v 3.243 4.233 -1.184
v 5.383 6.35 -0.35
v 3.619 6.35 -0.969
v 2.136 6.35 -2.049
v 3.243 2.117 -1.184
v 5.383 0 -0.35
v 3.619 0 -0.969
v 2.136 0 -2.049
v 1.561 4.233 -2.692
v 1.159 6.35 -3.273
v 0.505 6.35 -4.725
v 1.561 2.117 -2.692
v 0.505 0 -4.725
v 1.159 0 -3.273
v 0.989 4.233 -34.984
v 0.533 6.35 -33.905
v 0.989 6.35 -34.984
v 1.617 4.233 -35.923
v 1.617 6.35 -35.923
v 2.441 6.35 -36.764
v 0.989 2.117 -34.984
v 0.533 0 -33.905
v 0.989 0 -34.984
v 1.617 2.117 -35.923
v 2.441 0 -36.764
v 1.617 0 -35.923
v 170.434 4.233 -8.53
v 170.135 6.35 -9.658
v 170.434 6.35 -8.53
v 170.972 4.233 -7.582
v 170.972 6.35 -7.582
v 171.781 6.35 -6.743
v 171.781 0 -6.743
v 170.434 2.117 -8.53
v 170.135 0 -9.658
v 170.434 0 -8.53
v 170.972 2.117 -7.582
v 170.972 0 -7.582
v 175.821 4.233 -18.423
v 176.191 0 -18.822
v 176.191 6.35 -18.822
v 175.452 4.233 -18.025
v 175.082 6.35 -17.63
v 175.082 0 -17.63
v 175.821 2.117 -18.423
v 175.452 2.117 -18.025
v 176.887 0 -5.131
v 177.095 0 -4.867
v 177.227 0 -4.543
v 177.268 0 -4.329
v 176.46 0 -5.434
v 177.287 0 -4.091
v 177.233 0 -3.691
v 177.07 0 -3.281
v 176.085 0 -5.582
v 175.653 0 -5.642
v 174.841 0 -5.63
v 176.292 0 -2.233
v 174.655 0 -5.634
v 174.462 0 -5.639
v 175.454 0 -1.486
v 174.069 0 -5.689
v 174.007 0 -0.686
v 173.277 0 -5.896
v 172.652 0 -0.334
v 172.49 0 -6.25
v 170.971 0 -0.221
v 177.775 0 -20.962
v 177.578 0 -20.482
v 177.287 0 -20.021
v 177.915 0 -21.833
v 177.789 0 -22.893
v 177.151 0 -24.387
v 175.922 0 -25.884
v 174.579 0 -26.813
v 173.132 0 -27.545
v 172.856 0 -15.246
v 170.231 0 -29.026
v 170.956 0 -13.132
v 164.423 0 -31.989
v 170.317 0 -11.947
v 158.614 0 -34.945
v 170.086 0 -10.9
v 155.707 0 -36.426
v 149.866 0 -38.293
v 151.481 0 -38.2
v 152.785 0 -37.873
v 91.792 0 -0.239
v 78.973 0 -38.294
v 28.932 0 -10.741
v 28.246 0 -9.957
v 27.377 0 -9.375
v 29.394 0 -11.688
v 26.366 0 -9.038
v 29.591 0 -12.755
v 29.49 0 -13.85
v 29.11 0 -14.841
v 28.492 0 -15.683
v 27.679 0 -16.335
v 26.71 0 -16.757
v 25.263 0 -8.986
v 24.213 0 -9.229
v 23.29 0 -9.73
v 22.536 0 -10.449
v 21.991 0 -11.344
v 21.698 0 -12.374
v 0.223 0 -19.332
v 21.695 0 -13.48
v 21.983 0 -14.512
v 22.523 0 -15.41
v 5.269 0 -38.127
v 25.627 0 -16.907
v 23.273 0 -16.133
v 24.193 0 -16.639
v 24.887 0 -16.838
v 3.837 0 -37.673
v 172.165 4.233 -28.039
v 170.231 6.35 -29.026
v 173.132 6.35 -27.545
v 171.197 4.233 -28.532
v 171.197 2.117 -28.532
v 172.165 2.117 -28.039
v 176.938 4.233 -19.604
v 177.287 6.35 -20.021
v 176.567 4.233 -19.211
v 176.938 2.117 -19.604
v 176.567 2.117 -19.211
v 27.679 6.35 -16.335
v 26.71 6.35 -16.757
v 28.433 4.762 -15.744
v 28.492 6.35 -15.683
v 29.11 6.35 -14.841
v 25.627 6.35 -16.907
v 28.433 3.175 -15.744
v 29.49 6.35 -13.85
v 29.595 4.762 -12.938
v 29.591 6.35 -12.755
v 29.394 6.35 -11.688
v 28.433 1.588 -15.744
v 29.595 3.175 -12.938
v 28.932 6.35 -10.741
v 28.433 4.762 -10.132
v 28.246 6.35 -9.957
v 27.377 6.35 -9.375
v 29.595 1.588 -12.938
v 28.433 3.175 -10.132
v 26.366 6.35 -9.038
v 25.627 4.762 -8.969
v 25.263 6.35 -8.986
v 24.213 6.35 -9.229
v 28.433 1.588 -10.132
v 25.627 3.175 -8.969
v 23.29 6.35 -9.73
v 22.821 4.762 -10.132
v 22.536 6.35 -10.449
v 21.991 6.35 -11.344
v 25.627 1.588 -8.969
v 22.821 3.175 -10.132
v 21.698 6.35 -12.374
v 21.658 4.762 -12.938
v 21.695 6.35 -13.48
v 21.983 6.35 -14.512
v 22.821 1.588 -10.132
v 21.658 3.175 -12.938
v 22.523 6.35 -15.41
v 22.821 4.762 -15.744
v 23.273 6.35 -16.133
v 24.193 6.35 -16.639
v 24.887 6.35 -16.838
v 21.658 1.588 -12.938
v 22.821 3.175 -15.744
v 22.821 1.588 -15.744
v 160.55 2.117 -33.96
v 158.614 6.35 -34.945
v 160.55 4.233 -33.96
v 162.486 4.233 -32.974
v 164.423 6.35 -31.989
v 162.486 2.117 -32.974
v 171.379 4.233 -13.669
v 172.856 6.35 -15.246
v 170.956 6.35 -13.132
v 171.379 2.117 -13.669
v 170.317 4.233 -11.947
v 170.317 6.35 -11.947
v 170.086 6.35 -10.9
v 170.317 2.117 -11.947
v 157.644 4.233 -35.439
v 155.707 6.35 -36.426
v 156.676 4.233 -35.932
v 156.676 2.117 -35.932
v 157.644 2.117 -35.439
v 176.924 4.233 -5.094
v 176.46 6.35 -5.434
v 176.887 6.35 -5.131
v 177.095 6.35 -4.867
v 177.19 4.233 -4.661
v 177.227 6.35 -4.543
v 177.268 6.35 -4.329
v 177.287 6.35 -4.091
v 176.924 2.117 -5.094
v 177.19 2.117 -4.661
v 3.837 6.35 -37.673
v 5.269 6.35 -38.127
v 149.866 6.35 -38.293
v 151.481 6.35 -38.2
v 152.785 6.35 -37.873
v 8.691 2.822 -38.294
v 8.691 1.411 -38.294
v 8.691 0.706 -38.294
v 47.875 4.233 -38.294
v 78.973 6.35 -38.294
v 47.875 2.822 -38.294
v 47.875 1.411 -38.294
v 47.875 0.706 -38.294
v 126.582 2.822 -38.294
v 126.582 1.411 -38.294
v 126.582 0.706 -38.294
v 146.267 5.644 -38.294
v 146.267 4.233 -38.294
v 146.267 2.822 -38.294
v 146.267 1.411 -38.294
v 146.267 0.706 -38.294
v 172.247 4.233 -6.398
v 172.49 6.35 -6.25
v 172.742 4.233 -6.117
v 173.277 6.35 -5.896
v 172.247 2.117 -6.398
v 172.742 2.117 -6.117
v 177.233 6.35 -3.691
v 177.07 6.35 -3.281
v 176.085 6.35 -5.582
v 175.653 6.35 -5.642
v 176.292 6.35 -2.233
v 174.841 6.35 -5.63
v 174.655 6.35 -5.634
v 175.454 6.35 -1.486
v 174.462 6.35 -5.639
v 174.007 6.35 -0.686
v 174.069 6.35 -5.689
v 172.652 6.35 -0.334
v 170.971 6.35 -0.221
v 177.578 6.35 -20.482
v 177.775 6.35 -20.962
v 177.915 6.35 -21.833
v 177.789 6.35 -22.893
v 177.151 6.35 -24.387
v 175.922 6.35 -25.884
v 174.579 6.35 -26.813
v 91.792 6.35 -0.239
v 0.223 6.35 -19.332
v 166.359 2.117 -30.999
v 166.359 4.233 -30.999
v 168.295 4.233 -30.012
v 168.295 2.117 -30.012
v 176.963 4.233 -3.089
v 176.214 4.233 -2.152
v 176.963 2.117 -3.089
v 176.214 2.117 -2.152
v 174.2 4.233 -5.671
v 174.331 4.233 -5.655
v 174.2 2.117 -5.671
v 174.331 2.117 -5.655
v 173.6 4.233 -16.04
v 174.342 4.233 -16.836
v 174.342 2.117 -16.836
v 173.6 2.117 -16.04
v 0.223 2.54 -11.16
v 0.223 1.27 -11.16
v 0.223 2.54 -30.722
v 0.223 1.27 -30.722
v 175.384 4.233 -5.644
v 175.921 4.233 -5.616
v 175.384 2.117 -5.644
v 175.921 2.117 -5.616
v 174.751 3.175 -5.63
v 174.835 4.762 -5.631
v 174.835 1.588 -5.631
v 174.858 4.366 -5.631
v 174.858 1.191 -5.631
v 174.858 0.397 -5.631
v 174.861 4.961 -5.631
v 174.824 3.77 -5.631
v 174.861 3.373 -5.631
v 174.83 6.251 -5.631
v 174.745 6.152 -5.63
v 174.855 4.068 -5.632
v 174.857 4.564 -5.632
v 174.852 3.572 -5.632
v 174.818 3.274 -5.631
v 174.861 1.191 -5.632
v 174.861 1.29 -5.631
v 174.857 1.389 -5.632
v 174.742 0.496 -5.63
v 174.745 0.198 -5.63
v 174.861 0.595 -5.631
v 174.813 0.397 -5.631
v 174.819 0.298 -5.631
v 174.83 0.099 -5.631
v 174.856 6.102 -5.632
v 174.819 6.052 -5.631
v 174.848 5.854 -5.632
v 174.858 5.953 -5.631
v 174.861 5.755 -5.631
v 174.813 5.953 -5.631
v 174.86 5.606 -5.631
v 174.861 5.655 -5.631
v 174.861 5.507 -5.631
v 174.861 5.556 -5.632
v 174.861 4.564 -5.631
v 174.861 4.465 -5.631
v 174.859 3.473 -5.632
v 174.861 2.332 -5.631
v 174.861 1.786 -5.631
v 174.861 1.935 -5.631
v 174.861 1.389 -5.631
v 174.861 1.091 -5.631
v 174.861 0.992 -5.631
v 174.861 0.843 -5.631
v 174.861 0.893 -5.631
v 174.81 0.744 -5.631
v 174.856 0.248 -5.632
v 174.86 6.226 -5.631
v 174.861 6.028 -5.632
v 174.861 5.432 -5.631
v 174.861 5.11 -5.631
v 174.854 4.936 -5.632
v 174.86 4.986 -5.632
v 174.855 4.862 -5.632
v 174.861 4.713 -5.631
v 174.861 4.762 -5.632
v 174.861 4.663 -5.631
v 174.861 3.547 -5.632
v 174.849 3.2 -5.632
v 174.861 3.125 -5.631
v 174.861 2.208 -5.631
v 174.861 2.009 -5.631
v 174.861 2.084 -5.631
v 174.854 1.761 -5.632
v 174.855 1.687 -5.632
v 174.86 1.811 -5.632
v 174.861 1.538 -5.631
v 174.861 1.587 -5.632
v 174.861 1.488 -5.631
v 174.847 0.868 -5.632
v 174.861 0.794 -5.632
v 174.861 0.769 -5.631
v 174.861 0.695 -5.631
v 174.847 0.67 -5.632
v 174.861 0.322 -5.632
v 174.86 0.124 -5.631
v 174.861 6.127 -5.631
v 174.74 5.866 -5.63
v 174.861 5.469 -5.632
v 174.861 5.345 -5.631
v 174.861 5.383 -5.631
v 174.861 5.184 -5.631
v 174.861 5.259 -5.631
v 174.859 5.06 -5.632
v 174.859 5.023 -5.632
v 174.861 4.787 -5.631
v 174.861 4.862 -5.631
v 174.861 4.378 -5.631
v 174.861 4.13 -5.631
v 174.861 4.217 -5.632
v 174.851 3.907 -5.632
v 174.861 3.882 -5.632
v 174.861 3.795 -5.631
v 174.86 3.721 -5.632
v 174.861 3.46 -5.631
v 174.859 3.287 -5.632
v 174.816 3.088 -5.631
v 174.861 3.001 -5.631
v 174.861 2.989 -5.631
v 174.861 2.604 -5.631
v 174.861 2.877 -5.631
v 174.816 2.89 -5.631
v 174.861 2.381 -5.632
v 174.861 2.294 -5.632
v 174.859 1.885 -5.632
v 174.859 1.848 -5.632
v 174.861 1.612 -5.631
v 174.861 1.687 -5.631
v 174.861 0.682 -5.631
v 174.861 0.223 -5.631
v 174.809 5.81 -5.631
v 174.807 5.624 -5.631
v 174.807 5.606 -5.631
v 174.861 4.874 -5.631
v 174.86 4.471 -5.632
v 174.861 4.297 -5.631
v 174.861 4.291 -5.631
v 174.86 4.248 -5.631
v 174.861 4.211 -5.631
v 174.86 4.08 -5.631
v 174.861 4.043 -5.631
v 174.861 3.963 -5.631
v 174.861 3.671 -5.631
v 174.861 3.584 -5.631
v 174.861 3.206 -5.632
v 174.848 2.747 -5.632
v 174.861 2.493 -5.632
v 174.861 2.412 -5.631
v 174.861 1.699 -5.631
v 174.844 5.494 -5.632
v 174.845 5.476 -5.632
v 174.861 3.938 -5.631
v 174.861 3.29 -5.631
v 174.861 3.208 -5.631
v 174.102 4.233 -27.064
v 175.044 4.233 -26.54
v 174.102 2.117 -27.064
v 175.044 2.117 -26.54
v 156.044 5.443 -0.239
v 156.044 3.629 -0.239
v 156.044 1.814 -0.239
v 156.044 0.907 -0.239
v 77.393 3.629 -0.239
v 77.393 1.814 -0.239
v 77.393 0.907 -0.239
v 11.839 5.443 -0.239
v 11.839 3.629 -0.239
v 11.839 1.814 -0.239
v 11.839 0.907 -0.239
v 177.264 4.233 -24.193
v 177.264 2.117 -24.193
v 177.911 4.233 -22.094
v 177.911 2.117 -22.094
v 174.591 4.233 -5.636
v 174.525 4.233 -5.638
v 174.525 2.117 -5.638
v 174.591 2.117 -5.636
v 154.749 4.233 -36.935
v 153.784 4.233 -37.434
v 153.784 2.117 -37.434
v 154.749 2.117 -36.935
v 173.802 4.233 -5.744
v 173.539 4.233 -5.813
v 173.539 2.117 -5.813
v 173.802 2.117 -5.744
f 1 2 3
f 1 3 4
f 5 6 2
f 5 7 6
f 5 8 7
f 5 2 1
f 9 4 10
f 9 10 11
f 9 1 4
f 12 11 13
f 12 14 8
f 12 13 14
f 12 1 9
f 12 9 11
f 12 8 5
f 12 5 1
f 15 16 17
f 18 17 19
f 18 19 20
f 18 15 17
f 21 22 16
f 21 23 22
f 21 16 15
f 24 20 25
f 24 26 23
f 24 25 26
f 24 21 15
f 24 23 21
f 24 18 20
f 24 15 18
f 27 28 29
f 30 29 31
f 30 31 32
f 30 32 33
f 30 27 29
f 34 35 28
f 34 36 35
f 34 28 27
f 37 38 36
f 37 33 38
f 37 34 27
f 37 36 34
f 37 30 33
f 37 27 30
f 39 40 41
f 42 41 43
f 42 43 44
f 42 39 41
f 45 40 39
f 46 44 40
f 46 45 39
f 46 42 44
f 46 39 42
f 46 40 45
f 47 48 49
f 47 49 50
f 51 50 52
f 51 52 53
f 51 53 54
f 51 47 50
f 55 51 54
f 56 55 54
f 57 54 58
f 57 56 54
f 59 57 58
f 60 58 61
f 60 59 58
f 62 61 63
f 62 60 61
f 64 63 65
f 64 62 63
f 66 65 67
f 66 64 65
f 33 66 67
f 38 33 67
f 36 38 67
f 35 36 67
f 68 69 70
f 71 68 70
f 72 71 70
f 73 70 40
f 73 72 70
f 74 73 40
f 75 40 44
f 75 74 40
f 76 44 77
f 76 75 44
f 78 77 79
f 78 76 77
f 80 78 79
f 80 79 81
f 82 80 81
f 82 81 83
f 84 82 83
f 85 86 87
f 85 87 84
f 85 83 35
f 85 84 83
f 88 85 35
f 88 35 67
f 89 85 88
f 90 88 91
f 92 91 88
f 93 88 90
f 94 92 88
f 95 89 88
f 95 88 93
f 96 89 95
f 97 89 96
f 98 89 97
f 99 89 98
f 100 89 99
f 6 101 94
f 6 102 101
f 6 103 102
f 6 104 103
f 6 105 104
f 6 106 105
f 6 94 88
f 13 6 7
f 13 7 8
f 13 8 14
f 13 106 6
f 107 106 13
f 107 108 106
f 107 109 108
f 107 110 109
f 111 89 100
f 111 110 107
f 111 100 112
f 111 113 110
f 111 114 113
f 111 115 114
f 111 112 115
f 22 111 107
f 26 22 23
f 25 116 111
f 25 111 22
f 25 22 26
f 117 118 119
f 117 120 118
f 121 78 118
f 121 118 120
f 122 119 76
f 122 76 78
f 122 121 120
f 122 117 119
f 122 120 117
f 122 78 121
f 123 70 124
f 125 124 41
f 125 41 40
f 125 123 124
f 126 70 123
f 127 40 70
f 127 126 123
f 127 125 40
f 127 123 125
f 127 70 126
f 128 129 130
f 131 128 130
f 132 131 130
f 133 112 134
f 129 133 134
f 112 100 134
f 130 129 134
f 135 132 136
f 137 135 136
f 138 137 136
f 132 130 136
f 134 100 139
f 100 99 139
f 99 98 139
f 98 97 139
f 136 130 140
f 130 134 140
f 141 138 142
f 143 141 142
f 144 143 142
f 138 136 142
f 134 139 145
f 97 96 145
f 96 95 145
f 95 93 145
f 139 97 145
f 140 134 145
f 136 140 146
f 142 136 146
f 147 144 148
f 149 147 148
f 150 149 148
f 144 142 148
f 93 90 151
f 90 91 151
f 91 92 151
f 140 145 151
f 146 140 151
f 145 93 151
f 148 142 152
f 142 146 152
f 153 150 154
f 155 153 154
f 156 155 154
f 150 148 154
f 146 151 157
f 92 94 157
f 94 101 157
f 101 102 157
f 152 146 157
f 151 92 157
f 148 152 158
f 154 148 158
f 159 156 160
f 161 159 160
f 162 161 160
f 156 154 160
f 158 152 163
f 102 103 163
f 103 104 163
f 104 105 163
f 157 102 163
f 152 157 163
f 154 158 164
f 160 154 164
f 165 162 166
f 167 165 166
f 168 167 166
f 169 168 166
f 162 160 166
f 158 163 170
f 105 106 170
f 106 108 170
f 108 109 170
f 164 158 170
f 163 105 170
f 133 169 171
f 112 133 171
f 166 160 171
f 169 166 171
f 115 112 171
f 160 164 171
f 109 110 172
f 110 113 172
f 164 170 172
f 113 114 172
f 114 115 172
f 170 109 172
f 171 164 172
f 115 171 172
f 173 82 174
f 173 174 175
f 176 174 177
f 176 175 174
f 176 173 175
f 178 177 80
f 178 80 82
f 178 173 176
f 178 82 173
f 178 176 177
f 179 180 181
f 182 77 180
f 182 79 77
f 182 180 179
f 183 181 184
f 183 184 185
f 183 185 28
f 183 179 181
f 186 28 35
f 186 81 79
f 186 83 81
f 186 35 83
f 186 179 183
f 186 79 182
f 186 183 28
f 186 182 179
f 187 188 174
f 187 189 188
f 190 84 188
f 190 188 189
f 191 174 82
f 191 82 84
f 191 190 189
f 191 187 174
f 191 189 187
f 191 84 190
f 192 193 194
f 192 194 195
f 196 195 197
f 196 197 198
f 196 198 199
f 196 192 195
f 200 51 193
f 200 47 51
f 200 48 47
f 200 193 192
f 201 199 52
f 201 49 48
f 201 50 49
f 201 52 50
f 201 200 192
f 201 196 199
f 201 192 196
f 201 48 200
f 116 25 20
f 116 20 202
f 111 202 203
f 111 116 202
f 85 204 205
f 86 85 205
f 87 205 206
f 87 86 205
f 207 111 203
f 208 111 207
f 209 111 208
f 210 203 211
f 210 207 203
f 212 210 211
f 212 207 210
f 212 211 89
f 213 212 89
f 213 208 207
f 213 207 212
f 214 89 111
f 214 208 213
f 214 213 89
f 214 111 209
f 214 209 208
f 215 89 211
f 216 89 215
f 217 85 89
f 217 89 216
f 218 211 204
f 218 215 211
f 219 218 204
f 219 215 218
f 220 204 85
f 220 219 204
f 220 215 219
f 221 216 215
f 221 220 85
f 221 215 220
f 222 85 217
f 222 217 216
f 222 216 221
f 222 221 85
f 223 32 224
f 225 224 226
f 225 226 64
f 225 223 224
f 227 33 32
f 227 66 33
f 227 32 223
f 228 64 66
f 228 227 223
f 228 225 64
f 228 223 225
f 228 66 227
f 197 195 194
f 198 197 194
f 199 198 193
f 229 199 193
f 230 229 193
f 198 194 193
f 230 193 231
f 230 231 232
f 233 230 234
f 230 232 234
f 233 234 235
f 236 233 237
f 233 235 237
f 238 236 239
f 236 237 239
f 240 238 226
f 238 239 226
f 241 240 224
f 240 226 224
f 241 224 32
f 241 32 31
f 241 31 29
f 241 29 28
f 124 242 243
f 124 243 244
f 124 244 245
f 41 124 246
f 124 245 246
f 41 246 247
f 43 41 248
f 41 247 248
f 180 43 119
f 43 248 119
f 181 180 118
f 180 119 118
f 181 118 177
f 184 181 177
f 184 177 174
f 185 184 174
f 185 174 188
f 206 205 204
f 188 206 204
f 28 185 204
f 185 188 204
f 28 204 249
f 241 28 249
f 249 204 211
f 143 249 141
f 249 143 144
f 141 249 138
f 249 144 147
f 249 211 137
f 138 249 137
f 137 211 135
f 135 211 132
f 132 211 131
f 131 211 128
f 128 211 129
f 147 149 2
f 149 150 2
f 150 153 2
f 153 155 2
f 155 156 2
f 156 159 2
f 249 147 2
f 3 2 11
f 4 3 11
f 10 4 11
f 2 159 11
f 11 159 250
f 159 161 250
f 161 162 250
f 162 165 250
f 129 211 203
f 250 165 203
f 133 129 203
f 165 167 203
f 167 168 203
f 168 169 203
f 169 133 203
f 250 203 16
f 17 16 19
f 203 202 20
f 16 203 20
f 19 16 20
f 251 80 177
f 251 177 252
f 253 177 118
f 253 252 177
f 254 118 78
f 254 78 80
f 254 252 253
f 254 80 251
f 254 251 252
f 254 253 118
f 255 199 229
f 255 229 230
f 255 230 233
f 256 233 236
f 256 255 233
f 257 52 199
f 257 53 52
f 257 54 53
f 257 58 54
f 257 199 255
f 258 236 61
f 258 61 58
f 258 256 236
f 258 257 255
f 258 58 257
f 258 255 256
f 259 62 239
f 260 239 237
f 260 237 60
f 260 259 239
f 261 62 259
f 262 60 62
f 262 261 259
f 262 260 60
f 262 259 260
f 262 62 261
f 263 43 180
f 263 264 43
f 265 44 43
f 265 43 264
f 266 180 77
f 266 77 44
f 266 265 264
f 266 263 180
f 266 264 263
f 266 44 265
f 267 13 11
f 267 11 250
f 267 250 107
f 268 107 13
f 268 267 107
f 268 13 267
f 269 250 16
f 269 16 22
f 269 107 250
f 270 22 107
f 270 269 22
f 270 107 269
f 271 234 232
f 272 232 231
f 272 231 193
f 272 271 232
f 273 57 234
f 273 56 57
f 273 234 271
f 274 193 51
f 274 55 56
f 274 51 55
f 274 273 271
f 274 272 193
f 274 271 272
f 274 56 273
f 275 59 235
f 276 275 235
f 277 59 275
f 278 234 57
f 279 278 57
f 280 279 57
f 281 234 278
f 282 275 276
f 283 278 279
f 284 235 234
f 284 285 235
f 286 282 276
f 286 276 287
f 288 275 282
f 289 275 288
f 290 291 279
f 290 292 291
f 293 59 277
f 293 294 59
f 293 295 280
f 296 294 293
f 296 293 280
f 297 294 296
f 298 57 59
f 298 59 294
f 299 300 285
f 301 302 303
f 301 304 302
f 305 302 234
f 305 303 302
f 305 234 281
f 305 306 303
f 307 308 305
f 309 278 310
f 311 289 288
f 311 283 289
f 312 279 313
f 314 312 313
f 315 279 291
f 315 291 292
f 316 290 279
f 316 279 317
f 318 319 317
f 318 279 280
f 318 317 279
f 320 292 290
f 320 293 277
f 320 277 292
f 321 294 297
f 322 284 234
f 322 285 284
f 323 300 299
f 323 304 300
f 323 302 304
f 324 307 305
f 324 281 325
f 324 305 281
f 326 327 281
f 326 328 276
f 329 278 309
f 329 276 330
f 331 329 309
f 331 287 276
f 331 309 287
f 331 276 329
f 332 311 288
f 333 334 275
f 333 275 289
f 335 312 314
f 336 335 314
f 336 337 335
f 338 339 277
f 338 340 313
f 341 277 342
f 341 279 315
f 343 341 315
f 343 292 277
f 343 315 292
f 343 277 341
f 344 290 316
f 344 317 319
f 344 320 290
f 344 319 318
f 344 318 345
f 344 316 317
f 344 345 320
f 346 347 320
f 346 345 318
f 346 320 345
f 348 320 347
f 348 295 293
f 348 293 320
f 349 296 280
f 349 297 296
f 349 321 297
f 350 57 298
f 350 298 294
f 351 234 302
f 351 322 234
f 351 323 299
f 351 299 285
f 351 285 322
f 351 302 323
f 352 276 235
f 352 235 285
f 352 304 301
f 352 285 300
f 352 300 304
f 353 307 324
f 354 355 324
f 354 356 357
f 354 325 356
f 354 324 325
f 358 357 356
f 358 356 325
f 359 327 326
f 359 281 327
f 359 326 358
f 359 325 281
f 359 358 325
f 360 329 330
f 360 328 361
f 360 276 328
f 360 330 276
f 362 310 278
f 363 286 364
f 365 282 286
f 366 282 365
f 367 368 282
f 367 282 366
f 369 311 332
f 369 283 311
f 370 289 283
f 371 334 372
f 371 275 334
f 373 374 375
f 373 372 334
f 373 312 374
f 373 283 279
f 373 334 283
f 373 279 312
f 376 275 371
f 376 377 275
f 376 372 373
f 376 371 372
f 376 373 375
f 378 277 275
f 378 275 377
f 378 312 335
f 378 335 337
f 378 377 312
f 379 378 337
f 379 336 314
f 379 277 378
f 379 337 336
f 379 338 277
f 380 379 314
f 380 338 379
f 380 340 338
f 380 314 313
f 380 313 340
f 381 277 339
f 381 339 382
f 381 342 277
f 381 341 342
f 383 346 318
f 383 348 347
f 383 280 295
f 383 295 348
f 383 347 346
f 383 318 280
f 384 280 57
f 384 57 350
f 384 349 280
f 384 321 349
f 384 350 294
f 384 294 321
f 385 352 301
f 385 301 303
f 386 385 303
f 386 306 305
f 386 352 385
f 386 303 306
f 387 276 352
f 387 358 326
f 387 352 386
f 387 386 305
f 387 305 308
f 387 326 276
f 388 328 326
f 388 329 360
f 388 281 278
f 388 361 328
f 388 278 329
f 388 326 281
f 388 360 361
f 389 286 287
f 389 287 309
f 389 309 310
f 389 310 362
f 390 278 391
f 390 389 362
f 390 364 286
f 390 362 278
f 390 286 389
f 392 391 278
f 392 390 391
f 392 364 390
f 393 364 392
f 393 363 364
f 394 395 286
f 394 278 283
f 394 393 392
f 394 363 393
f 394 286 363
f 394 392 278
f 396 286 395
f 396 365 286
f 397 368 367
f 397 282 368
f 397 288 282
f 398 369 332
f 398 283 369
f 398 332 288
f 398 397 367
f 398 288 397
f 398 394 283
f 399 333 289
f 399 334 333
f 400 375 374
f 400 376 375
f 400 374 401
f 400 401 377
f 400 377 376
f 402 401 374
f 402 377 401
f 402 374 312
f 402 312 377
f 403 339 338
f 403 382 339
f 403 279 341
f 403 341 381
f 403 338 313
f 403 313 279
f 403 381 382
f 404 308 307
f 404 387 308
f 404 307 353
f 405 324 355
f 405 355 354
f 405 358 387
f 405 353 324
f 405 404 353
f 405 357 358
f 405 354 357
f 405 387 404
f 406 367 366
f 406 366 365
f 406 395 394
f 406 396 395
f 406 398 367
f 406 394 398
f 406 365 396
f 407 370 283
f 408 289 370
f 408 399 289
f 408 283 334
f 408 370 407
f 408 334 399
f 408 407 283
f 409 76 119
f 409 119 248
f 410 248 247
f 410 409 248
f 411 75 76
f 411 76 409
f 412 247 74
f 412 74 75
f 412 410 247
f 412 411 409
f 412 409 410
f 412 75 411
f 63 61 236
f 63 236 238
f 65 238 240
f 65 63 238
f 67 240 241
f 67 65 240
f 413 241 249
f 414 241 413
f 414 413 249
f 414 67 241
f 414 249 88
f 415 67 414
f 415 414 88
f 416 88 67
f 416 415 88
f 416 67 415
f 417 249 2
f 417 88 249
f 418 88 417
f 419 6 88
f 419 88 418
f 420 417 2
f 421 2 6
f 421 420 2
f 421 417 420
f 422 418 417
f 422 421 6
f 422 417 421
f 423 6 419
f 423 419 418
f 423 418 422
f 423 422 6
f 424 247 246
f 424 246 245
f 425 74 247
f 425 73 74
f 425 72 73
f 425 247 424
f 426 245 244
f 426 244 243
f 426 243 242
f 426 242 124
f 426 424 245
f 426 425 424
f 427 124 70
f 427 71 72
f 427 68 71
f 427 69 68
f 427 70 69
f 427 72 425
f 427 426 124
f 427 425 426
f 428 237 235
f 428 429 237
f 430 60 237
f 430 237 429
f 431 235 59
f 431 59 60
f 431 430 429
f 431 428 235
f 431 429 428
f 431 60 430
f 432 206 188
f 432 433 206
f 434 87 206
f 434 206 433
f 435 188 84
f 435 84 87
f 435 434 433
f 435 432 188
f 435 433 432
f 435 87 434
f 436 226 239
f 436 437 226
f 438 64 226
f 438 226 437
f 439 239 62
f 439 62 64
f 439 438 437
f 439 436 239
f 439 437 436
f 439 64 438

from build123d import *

# Parameters (mm, degrees)
BOSS_EXTRUDE1_DEPTH = 6.35


with BuildPart() as part:
    # Sketch1 → Boss-Extrude1 (new body)
    with BuildSketch(Plane(origin=(0, 0, 0), x_dir=(1, 0, 0), z_dir=(0, 1, 0))):
        with BuildLine():
            add(Edge.make_bspline(
                [(174.840646, 5.6295036), (175.391826, 5.627243), (175.9154724, 5.730748), (176.4597944, 5.4342538)],
                knots=[0, 0, 0, 0, 1, 1, 1, 1], degree=3))
            add(Edge.make_bspline(
                [(176.4597944, 5.4342538), (177.0317008, 5.1242468), (177.2659396, 4.7452534), (177.2866152, 4.0906446)],
                knots=[0, 0, 0, 0, 1, 1, 1, 1], degree=3))
            add(Edge.make_bspline(
                [(177.2866152, 4.0906446), (177.3141234, 3.1260542), (176.0808518, 1.947799), (175.4538274, 1.4862048)],
                knots=[0, 0, 0, 0, 1, 1, 1, 1], degree=3))
            add(Edge.make_bspline(
                [(175.4538274, 1.4862048), (173.407451, -0.0296672), (171.3541658, 0.2390394), (169.1217598, 0.2390394)],
                knots=[0, 0, 0, 0, 1, 1, 1, 1], degree=3))
            add(Edge.make_bspline(
                [(169.1217598, 0.2390394), (164.7602496, 0.2390394), (160.3987648, 0.2390394), (156.0441634, 0.2390394)],
                knots=[0, 0, 0, 0, 1, 1, 1, 1], degree=3))
            add(Edge.make_bspline(
                [(156.0441634, 0.2390394), (147.3211938, 0.2390394), (138.5981988, 0.2390394), (129.8821126, 0.2390394)],
                knots=[0, 0, 0, 0, 1, 1, 1, 1], degree=3))
            add(Edge.make_bspline(
                [(129.8821126, 0.2390394), (112.3879134, 0.2390394), (94.8937142, 0.2390394), (77.3926316, 0.2390394)],
                knots=[0, 0, 0, 0, 1, 1, 1, 1], degree=3))
            add(Edge.make_bspline(
                [(77.3926316, 0.2390394), (59.8846656, 0.2390394), (42.383583, 0.2390394), (24.8755916, 0.2390394)],
                knots=[0, 0, 0, 0, 1, 1, 1, 1], degree=3))
            add(Edge.make_bspline(
                [(24.8755916, 0.2390394), (20.527899, 0.2390394), (16.180181, 0.2390394), (11.8393464, 0.2390394)],
                knots=[0, 0, 0, 0, 1, 1, 1, 1], degree=3))
            add(Edge.make_bspline(
                [(11.8393464, 0.2390394), (11.0194344, 0.2390394), (6.2100714, 0.1990344), (5.3832506, 0.3495548)],
                knots=[0, 0, 0, 0, 1, 1, 1, 1], degree=3))
            add(Edge.make_bspline(
                [(5.3832506, 0.3495548), (3.0681422, 0.7975346), (1.1940032, 2.4785828), (0.5050028, 4.724781)],
                knots=[0, 0, 0, 0, 1, 1, 1, 1], degree=3))
            add(Edge.make_bspline(
                [(0.5050028, 4.724781), (0.1811528, 5.7858914), (0.222504, 6.8331842), (0.222504, 7.9080868)],
                knots=[0, 0, 0, 0, 1, 1, 1, 1], degree=3))
            add(Edge.make_bspline(
                [(0.222504, 7.9080868), (0.222504, 8.9898474), (0.222504, 10.0784914), (0.222504, 11.160252)],
                knots=[0, 0, 0, 0, 1, 1, 1, 1], degree=3))
            add(Edge.make_bspline(
                [(0.222504, 11.160252), (0.222504, 13.33754), (0.222504, 15.5079446), (0.222504, 17.6784)],
                knots=[0, 0, 0, 0, 1, 1, 1, 1], degree=3))
            add(Edge.make_bspline(
                [(0.222504, 17.6784), (0.222504, 22.0260926), (0.222504, 26.3737852), (0.222504, 30.7215032)],
                knots=[0, 0, 0, 0, 1, 1, 1, 1], degree=3))
            add(Edge.make_bspline(
                [(0.222504, 30.7215032), (0.222504, 31.796355), (0.194945, 32.8436986), (0.5325618, 33.9047328)],
                knots=[0, 0, 0, 0, 1, 1, 1, 1], degree=3))
            add(Edge.make_bspline(
                [(0.5325618, 33.9047328), (0.9115044, 35.0691958), (1.5109698, 35.9580434), (2.4411432, 36.7641886)],
                knots=[0, 0, 0, 0, 1, 1, 1, 1], degree=3))
            add(Edge.make_bspline(
                [(2.4411432, 36.7641886), (4.3979592, 38.4453892), (6.42366, 38.2938528), (8.6905338, 38.2938528)],
                knots=[0, 0, 0, 0, 1, 1, 1, 1], degree=3))
            add(Edge.make_bspline(
                [(8.6905338, 38.2938528), (13.0451352, 38.2938528), (17.3997366, 38.2938528), (21.754338, 38.2938528)],
                knots=[0, 0, 0, 0, 1, 1, 1, 1], degree=3))
            add(Edge.make_bspline(
                [(21.754338, 38.2938528), (30.4635408, 38.2938528), (39.1658602, 38.2938528), (47.875063, 38.2938528)],
                knots=[0, 0, 0, 0, 1, 1, 1, 1], degree=3))
            add(Edge.make_bspline(
                [(47.875063, 38.2938528), (65.3623534, 38.2938528), (82.8496692, 38.2938528), (100.3369596, 38.2938528)],
                knots=[0, 0, 0, 0, 1, 1, 1, 1], degree=3))
            add(Edge.make_bspline(
                [(100.3369596, 38.2938528), (109.0875136, 38.2938528), (117.8311588, 38.2938528), (126.5817128, 38.2938528)],
                knots=[0, 0, 0, 0, 1, 1, 1, 1], degree=3))
            add(Edge.make_bspline(
                [(126.5817128, 38.2938528), (130.9569898, 38.2938528), (135.3322414, 38.2938528), (139.7075184, 38.2938528)],
                knots=[0, 0, 0, 0, 1, 1, 1, 1], degree=3))
            add(Edge.make_bspline(
                [(139.7075184, 38.2938528), (141.8917152, 38.2938528), (144.0827954, 38.2938528), (146.2669922, 38.2938528)],
                knots=[0, 0, 0, 0, 1, 1, 1, 1], degree=3))
            add(Edge.make_bspline(
                [(146.2669922, 38.2938528), (147.3625196, 38.2938528), (148.4580724, 38.2938528), (149.5535998, 38.2938528)],
                knots=[0, 0, 0, 0, 1, 1, 1, 1], degree=3))
            add(Edge.make_bspline(
                [(149.5535998, 38.2938528), (150.656036, 38.2938528), (151.717121, 38.2788414), (152.7851148, 37.8733304)],
                knots=[0, 0, 0, 0, 1, 1, 1, 1], degree=3))
            add(Edge.make_bspline(
                [(152.7851148, 37.8733304), (153.8117574, 37.4808496), (154.7419308, 36.9224814), (155.7065466, 36.4264448)],
                knots=[0, 0, 0, 0, 1, 1, 1, 1], degree=3))
            add(Edge.make_bspline(
                [(155.7065466, 36.4264448), (156.6780712, 35.9304336), (157.642687, 35.4411534), (158.6142116, 34.9450406)],
                knots=[0, 0, 0, 0, 1, 1, 1, 1], degree=3))
            add(Edge.make_bspline(
                [(158.6142116, 34.9450406), (160.550352, 33.9597492), (162.4864924, 32.9744324), (164.4226328, 31.989141)],
                knots=[0, 0, 0, 0, 1, 1, 1, 1], degree=3))
            add(Edge.make_bspline(
                [(164.4226328, 31.989141), (166.3587732, 30.9969408), (168.2949136, 30.0116494), (170.2310794, 29.0263326)],
                knots=[0, 0, 0, 0, 1, 1, 1, 1], degree=3))
            add(Edge.make_bspline(
                [(170.2310794, 29.0263326), (171.1956952, 28.5303468), (172.1672198, 28.041092), (173.1318356, 27.5450046)],
                knots=[0, 0, 0, 0, 1, 1, 1, 1], degree=3))
            add(Edge.make_bspline(
                [(173.1318356, 27.5450046), (174.1033602, 27.0554958), (175.0886516, 26.6354306), (175.9223558, 25.8844542)],
                knots=[0, 0, 0, 0, 1, 1, 1, 1], degree=3))
            add(Edge.make_bspline(
                [(175.9223558, 25.8844542), (177.4175522, 24.540845), (178.7404604, 21.9363544), (177.2866152, 20.0208896)],
                knots=[0, 0, 0, 0, 1, 1, 1, 1], degree=3))
            add(Edge.make_bspline(
                [(177.2866152, 20.0208896), (176.9558818, 19.5869052), (176.5631724, 19.2147444), (176.1910878, 18.8219842)],
                knots=[0, 0, 0, 0, 1, 1, 1, 1], degree=3))
            add(Edge.make_bspline(
                [(176.1910878, 18.8219842), (175.8190286, 18.422493), (175.4538274, 18.0227478), (175.0817682, 17.6299876)],
                knots=[0, 0, 0, 0, 1, 1, 1, 1], degree=3))
            add(Edge.make_bspline(
                [(175.0817682, 17.6299876), (174.3445078, 16.8375838), (173.600364, 16.0383474), (172.8562202, 15.2459944)],
                knots=[0, 0, 0, 0, 1, 1, 1, 1], degree=3))
            add(Edge.make_bspline(
                [(172.8562202, 15.2459944), (171.3266322, 13.5992362), (169.7211998, 12.3727464), (170.1346102, 9.6580452)],
                knots=[0, 0, 0, 0, 1, 1, 1, 1], degree=3))
            add(Edge.make_bspline(
                [(170.1346102, 9.6580452), (170.3274978, 8.4177886), (170.823636, 7.549642), (171.7813684, 6.7434968)],
                knots=[0, 0, 0, 0, 1, 1, 1, 1], degree=3))
            add(Edge.make_bspline(
                [(171.7813684, 6.7434968), (172.2361046, 6.3645034), (172.7184252, 6.088888), (173.276514, 5.8960004)],
                knots=[0, 0, 0, 0, 1, 1, 1, 1], degree=3))
            add(Edge.make_bspline(
                [(173.276514, 5.8960004), (173.5383626, 5.8064908), (173.8001858, 5.7375044), (174.0688924, 5.6894984)],
                knots=[0, 0, 0, 0, 1, 1, 1, 1], degree=3))
            add(Edge.make_bspline(
                [(174.0688924, 5.6894984), (174.199804, 5.6694832), (174.330741, 5.6544972), (174.4616526, 5.6394858)],
                knots=[0, 0, 0, 0, 1, 1, 1, 1], degree=3))
            add(Edge.make_bspline(
                [(174.4616526, 5.6394858), (174.5237556, 5.6394858), (174.5925388, 5.634482), (174.6545402, 5.634482)],
                knots=[0, 0, 0, 0, 1, 1, 1, 1], degree=3))
            add(Edge.make_bspline(
                [(174.6545402, 5.634482), (174.6890588, 5.6295036), (174.7166432, 5.6295036), (174.7510602, 5.6295036)],
                knots=[0, 0, 0, 0, 1, 1, 1, 1], degree=3))
            add(Edge.make_bspline(
                [(174.7510602, 5.6295036), (174.7855534, 5.6295036), (174.9094546, 5.634482), (174.840646, 5.6295036)],
                knots=[0, 0, 0, 0, 1, 1, 1, 1], degree=3))
        make_face()
        with BuildLine():
            add(Edge.make_bspline(
                [(29.5953942, 12.9377948), (29.5953942, 10.7466892), (27.817699, 8.9690448), (25.6266188, 8.9690448)],
                knots=[0, 0, 0, 0, 1, 1, 1, 1], degree=3))
            add(Edge.make_bspline(
                [(25.6266188, 8.9690448), (23.4355386, 8.9690448), (21.6578688, 10.7466892), (21.6578688, 12.9377948)],
                knots=[0, 0, 0, 0, 1, 1, 1, 1], degree=3))
            add(Edge.make_bspline(
                [(21.6578688, 12.9377948), (21.6578688, 15.1288496), (23.4355386, 16.9065448), (25.6266188, 16.9065448)],
                knots=[0, 0, 0, 0, 1, 1, 1, 1], degree=3))
            add(Edge.make_bspline(
                [(25.6266188, 16.9065448), (27.817699, 16.9065448), (29.5953942, 15.1288496), (29.5953942, 12.9377948)],
                knots=[0, 0, 0, 0, 1, 1, 1, 1], degree=3))
        make_face(mode=Mode.SUBTRACT)
    extrude(amount=BOSS_EXTRUDE1_DEPTH)


solid = part.part
